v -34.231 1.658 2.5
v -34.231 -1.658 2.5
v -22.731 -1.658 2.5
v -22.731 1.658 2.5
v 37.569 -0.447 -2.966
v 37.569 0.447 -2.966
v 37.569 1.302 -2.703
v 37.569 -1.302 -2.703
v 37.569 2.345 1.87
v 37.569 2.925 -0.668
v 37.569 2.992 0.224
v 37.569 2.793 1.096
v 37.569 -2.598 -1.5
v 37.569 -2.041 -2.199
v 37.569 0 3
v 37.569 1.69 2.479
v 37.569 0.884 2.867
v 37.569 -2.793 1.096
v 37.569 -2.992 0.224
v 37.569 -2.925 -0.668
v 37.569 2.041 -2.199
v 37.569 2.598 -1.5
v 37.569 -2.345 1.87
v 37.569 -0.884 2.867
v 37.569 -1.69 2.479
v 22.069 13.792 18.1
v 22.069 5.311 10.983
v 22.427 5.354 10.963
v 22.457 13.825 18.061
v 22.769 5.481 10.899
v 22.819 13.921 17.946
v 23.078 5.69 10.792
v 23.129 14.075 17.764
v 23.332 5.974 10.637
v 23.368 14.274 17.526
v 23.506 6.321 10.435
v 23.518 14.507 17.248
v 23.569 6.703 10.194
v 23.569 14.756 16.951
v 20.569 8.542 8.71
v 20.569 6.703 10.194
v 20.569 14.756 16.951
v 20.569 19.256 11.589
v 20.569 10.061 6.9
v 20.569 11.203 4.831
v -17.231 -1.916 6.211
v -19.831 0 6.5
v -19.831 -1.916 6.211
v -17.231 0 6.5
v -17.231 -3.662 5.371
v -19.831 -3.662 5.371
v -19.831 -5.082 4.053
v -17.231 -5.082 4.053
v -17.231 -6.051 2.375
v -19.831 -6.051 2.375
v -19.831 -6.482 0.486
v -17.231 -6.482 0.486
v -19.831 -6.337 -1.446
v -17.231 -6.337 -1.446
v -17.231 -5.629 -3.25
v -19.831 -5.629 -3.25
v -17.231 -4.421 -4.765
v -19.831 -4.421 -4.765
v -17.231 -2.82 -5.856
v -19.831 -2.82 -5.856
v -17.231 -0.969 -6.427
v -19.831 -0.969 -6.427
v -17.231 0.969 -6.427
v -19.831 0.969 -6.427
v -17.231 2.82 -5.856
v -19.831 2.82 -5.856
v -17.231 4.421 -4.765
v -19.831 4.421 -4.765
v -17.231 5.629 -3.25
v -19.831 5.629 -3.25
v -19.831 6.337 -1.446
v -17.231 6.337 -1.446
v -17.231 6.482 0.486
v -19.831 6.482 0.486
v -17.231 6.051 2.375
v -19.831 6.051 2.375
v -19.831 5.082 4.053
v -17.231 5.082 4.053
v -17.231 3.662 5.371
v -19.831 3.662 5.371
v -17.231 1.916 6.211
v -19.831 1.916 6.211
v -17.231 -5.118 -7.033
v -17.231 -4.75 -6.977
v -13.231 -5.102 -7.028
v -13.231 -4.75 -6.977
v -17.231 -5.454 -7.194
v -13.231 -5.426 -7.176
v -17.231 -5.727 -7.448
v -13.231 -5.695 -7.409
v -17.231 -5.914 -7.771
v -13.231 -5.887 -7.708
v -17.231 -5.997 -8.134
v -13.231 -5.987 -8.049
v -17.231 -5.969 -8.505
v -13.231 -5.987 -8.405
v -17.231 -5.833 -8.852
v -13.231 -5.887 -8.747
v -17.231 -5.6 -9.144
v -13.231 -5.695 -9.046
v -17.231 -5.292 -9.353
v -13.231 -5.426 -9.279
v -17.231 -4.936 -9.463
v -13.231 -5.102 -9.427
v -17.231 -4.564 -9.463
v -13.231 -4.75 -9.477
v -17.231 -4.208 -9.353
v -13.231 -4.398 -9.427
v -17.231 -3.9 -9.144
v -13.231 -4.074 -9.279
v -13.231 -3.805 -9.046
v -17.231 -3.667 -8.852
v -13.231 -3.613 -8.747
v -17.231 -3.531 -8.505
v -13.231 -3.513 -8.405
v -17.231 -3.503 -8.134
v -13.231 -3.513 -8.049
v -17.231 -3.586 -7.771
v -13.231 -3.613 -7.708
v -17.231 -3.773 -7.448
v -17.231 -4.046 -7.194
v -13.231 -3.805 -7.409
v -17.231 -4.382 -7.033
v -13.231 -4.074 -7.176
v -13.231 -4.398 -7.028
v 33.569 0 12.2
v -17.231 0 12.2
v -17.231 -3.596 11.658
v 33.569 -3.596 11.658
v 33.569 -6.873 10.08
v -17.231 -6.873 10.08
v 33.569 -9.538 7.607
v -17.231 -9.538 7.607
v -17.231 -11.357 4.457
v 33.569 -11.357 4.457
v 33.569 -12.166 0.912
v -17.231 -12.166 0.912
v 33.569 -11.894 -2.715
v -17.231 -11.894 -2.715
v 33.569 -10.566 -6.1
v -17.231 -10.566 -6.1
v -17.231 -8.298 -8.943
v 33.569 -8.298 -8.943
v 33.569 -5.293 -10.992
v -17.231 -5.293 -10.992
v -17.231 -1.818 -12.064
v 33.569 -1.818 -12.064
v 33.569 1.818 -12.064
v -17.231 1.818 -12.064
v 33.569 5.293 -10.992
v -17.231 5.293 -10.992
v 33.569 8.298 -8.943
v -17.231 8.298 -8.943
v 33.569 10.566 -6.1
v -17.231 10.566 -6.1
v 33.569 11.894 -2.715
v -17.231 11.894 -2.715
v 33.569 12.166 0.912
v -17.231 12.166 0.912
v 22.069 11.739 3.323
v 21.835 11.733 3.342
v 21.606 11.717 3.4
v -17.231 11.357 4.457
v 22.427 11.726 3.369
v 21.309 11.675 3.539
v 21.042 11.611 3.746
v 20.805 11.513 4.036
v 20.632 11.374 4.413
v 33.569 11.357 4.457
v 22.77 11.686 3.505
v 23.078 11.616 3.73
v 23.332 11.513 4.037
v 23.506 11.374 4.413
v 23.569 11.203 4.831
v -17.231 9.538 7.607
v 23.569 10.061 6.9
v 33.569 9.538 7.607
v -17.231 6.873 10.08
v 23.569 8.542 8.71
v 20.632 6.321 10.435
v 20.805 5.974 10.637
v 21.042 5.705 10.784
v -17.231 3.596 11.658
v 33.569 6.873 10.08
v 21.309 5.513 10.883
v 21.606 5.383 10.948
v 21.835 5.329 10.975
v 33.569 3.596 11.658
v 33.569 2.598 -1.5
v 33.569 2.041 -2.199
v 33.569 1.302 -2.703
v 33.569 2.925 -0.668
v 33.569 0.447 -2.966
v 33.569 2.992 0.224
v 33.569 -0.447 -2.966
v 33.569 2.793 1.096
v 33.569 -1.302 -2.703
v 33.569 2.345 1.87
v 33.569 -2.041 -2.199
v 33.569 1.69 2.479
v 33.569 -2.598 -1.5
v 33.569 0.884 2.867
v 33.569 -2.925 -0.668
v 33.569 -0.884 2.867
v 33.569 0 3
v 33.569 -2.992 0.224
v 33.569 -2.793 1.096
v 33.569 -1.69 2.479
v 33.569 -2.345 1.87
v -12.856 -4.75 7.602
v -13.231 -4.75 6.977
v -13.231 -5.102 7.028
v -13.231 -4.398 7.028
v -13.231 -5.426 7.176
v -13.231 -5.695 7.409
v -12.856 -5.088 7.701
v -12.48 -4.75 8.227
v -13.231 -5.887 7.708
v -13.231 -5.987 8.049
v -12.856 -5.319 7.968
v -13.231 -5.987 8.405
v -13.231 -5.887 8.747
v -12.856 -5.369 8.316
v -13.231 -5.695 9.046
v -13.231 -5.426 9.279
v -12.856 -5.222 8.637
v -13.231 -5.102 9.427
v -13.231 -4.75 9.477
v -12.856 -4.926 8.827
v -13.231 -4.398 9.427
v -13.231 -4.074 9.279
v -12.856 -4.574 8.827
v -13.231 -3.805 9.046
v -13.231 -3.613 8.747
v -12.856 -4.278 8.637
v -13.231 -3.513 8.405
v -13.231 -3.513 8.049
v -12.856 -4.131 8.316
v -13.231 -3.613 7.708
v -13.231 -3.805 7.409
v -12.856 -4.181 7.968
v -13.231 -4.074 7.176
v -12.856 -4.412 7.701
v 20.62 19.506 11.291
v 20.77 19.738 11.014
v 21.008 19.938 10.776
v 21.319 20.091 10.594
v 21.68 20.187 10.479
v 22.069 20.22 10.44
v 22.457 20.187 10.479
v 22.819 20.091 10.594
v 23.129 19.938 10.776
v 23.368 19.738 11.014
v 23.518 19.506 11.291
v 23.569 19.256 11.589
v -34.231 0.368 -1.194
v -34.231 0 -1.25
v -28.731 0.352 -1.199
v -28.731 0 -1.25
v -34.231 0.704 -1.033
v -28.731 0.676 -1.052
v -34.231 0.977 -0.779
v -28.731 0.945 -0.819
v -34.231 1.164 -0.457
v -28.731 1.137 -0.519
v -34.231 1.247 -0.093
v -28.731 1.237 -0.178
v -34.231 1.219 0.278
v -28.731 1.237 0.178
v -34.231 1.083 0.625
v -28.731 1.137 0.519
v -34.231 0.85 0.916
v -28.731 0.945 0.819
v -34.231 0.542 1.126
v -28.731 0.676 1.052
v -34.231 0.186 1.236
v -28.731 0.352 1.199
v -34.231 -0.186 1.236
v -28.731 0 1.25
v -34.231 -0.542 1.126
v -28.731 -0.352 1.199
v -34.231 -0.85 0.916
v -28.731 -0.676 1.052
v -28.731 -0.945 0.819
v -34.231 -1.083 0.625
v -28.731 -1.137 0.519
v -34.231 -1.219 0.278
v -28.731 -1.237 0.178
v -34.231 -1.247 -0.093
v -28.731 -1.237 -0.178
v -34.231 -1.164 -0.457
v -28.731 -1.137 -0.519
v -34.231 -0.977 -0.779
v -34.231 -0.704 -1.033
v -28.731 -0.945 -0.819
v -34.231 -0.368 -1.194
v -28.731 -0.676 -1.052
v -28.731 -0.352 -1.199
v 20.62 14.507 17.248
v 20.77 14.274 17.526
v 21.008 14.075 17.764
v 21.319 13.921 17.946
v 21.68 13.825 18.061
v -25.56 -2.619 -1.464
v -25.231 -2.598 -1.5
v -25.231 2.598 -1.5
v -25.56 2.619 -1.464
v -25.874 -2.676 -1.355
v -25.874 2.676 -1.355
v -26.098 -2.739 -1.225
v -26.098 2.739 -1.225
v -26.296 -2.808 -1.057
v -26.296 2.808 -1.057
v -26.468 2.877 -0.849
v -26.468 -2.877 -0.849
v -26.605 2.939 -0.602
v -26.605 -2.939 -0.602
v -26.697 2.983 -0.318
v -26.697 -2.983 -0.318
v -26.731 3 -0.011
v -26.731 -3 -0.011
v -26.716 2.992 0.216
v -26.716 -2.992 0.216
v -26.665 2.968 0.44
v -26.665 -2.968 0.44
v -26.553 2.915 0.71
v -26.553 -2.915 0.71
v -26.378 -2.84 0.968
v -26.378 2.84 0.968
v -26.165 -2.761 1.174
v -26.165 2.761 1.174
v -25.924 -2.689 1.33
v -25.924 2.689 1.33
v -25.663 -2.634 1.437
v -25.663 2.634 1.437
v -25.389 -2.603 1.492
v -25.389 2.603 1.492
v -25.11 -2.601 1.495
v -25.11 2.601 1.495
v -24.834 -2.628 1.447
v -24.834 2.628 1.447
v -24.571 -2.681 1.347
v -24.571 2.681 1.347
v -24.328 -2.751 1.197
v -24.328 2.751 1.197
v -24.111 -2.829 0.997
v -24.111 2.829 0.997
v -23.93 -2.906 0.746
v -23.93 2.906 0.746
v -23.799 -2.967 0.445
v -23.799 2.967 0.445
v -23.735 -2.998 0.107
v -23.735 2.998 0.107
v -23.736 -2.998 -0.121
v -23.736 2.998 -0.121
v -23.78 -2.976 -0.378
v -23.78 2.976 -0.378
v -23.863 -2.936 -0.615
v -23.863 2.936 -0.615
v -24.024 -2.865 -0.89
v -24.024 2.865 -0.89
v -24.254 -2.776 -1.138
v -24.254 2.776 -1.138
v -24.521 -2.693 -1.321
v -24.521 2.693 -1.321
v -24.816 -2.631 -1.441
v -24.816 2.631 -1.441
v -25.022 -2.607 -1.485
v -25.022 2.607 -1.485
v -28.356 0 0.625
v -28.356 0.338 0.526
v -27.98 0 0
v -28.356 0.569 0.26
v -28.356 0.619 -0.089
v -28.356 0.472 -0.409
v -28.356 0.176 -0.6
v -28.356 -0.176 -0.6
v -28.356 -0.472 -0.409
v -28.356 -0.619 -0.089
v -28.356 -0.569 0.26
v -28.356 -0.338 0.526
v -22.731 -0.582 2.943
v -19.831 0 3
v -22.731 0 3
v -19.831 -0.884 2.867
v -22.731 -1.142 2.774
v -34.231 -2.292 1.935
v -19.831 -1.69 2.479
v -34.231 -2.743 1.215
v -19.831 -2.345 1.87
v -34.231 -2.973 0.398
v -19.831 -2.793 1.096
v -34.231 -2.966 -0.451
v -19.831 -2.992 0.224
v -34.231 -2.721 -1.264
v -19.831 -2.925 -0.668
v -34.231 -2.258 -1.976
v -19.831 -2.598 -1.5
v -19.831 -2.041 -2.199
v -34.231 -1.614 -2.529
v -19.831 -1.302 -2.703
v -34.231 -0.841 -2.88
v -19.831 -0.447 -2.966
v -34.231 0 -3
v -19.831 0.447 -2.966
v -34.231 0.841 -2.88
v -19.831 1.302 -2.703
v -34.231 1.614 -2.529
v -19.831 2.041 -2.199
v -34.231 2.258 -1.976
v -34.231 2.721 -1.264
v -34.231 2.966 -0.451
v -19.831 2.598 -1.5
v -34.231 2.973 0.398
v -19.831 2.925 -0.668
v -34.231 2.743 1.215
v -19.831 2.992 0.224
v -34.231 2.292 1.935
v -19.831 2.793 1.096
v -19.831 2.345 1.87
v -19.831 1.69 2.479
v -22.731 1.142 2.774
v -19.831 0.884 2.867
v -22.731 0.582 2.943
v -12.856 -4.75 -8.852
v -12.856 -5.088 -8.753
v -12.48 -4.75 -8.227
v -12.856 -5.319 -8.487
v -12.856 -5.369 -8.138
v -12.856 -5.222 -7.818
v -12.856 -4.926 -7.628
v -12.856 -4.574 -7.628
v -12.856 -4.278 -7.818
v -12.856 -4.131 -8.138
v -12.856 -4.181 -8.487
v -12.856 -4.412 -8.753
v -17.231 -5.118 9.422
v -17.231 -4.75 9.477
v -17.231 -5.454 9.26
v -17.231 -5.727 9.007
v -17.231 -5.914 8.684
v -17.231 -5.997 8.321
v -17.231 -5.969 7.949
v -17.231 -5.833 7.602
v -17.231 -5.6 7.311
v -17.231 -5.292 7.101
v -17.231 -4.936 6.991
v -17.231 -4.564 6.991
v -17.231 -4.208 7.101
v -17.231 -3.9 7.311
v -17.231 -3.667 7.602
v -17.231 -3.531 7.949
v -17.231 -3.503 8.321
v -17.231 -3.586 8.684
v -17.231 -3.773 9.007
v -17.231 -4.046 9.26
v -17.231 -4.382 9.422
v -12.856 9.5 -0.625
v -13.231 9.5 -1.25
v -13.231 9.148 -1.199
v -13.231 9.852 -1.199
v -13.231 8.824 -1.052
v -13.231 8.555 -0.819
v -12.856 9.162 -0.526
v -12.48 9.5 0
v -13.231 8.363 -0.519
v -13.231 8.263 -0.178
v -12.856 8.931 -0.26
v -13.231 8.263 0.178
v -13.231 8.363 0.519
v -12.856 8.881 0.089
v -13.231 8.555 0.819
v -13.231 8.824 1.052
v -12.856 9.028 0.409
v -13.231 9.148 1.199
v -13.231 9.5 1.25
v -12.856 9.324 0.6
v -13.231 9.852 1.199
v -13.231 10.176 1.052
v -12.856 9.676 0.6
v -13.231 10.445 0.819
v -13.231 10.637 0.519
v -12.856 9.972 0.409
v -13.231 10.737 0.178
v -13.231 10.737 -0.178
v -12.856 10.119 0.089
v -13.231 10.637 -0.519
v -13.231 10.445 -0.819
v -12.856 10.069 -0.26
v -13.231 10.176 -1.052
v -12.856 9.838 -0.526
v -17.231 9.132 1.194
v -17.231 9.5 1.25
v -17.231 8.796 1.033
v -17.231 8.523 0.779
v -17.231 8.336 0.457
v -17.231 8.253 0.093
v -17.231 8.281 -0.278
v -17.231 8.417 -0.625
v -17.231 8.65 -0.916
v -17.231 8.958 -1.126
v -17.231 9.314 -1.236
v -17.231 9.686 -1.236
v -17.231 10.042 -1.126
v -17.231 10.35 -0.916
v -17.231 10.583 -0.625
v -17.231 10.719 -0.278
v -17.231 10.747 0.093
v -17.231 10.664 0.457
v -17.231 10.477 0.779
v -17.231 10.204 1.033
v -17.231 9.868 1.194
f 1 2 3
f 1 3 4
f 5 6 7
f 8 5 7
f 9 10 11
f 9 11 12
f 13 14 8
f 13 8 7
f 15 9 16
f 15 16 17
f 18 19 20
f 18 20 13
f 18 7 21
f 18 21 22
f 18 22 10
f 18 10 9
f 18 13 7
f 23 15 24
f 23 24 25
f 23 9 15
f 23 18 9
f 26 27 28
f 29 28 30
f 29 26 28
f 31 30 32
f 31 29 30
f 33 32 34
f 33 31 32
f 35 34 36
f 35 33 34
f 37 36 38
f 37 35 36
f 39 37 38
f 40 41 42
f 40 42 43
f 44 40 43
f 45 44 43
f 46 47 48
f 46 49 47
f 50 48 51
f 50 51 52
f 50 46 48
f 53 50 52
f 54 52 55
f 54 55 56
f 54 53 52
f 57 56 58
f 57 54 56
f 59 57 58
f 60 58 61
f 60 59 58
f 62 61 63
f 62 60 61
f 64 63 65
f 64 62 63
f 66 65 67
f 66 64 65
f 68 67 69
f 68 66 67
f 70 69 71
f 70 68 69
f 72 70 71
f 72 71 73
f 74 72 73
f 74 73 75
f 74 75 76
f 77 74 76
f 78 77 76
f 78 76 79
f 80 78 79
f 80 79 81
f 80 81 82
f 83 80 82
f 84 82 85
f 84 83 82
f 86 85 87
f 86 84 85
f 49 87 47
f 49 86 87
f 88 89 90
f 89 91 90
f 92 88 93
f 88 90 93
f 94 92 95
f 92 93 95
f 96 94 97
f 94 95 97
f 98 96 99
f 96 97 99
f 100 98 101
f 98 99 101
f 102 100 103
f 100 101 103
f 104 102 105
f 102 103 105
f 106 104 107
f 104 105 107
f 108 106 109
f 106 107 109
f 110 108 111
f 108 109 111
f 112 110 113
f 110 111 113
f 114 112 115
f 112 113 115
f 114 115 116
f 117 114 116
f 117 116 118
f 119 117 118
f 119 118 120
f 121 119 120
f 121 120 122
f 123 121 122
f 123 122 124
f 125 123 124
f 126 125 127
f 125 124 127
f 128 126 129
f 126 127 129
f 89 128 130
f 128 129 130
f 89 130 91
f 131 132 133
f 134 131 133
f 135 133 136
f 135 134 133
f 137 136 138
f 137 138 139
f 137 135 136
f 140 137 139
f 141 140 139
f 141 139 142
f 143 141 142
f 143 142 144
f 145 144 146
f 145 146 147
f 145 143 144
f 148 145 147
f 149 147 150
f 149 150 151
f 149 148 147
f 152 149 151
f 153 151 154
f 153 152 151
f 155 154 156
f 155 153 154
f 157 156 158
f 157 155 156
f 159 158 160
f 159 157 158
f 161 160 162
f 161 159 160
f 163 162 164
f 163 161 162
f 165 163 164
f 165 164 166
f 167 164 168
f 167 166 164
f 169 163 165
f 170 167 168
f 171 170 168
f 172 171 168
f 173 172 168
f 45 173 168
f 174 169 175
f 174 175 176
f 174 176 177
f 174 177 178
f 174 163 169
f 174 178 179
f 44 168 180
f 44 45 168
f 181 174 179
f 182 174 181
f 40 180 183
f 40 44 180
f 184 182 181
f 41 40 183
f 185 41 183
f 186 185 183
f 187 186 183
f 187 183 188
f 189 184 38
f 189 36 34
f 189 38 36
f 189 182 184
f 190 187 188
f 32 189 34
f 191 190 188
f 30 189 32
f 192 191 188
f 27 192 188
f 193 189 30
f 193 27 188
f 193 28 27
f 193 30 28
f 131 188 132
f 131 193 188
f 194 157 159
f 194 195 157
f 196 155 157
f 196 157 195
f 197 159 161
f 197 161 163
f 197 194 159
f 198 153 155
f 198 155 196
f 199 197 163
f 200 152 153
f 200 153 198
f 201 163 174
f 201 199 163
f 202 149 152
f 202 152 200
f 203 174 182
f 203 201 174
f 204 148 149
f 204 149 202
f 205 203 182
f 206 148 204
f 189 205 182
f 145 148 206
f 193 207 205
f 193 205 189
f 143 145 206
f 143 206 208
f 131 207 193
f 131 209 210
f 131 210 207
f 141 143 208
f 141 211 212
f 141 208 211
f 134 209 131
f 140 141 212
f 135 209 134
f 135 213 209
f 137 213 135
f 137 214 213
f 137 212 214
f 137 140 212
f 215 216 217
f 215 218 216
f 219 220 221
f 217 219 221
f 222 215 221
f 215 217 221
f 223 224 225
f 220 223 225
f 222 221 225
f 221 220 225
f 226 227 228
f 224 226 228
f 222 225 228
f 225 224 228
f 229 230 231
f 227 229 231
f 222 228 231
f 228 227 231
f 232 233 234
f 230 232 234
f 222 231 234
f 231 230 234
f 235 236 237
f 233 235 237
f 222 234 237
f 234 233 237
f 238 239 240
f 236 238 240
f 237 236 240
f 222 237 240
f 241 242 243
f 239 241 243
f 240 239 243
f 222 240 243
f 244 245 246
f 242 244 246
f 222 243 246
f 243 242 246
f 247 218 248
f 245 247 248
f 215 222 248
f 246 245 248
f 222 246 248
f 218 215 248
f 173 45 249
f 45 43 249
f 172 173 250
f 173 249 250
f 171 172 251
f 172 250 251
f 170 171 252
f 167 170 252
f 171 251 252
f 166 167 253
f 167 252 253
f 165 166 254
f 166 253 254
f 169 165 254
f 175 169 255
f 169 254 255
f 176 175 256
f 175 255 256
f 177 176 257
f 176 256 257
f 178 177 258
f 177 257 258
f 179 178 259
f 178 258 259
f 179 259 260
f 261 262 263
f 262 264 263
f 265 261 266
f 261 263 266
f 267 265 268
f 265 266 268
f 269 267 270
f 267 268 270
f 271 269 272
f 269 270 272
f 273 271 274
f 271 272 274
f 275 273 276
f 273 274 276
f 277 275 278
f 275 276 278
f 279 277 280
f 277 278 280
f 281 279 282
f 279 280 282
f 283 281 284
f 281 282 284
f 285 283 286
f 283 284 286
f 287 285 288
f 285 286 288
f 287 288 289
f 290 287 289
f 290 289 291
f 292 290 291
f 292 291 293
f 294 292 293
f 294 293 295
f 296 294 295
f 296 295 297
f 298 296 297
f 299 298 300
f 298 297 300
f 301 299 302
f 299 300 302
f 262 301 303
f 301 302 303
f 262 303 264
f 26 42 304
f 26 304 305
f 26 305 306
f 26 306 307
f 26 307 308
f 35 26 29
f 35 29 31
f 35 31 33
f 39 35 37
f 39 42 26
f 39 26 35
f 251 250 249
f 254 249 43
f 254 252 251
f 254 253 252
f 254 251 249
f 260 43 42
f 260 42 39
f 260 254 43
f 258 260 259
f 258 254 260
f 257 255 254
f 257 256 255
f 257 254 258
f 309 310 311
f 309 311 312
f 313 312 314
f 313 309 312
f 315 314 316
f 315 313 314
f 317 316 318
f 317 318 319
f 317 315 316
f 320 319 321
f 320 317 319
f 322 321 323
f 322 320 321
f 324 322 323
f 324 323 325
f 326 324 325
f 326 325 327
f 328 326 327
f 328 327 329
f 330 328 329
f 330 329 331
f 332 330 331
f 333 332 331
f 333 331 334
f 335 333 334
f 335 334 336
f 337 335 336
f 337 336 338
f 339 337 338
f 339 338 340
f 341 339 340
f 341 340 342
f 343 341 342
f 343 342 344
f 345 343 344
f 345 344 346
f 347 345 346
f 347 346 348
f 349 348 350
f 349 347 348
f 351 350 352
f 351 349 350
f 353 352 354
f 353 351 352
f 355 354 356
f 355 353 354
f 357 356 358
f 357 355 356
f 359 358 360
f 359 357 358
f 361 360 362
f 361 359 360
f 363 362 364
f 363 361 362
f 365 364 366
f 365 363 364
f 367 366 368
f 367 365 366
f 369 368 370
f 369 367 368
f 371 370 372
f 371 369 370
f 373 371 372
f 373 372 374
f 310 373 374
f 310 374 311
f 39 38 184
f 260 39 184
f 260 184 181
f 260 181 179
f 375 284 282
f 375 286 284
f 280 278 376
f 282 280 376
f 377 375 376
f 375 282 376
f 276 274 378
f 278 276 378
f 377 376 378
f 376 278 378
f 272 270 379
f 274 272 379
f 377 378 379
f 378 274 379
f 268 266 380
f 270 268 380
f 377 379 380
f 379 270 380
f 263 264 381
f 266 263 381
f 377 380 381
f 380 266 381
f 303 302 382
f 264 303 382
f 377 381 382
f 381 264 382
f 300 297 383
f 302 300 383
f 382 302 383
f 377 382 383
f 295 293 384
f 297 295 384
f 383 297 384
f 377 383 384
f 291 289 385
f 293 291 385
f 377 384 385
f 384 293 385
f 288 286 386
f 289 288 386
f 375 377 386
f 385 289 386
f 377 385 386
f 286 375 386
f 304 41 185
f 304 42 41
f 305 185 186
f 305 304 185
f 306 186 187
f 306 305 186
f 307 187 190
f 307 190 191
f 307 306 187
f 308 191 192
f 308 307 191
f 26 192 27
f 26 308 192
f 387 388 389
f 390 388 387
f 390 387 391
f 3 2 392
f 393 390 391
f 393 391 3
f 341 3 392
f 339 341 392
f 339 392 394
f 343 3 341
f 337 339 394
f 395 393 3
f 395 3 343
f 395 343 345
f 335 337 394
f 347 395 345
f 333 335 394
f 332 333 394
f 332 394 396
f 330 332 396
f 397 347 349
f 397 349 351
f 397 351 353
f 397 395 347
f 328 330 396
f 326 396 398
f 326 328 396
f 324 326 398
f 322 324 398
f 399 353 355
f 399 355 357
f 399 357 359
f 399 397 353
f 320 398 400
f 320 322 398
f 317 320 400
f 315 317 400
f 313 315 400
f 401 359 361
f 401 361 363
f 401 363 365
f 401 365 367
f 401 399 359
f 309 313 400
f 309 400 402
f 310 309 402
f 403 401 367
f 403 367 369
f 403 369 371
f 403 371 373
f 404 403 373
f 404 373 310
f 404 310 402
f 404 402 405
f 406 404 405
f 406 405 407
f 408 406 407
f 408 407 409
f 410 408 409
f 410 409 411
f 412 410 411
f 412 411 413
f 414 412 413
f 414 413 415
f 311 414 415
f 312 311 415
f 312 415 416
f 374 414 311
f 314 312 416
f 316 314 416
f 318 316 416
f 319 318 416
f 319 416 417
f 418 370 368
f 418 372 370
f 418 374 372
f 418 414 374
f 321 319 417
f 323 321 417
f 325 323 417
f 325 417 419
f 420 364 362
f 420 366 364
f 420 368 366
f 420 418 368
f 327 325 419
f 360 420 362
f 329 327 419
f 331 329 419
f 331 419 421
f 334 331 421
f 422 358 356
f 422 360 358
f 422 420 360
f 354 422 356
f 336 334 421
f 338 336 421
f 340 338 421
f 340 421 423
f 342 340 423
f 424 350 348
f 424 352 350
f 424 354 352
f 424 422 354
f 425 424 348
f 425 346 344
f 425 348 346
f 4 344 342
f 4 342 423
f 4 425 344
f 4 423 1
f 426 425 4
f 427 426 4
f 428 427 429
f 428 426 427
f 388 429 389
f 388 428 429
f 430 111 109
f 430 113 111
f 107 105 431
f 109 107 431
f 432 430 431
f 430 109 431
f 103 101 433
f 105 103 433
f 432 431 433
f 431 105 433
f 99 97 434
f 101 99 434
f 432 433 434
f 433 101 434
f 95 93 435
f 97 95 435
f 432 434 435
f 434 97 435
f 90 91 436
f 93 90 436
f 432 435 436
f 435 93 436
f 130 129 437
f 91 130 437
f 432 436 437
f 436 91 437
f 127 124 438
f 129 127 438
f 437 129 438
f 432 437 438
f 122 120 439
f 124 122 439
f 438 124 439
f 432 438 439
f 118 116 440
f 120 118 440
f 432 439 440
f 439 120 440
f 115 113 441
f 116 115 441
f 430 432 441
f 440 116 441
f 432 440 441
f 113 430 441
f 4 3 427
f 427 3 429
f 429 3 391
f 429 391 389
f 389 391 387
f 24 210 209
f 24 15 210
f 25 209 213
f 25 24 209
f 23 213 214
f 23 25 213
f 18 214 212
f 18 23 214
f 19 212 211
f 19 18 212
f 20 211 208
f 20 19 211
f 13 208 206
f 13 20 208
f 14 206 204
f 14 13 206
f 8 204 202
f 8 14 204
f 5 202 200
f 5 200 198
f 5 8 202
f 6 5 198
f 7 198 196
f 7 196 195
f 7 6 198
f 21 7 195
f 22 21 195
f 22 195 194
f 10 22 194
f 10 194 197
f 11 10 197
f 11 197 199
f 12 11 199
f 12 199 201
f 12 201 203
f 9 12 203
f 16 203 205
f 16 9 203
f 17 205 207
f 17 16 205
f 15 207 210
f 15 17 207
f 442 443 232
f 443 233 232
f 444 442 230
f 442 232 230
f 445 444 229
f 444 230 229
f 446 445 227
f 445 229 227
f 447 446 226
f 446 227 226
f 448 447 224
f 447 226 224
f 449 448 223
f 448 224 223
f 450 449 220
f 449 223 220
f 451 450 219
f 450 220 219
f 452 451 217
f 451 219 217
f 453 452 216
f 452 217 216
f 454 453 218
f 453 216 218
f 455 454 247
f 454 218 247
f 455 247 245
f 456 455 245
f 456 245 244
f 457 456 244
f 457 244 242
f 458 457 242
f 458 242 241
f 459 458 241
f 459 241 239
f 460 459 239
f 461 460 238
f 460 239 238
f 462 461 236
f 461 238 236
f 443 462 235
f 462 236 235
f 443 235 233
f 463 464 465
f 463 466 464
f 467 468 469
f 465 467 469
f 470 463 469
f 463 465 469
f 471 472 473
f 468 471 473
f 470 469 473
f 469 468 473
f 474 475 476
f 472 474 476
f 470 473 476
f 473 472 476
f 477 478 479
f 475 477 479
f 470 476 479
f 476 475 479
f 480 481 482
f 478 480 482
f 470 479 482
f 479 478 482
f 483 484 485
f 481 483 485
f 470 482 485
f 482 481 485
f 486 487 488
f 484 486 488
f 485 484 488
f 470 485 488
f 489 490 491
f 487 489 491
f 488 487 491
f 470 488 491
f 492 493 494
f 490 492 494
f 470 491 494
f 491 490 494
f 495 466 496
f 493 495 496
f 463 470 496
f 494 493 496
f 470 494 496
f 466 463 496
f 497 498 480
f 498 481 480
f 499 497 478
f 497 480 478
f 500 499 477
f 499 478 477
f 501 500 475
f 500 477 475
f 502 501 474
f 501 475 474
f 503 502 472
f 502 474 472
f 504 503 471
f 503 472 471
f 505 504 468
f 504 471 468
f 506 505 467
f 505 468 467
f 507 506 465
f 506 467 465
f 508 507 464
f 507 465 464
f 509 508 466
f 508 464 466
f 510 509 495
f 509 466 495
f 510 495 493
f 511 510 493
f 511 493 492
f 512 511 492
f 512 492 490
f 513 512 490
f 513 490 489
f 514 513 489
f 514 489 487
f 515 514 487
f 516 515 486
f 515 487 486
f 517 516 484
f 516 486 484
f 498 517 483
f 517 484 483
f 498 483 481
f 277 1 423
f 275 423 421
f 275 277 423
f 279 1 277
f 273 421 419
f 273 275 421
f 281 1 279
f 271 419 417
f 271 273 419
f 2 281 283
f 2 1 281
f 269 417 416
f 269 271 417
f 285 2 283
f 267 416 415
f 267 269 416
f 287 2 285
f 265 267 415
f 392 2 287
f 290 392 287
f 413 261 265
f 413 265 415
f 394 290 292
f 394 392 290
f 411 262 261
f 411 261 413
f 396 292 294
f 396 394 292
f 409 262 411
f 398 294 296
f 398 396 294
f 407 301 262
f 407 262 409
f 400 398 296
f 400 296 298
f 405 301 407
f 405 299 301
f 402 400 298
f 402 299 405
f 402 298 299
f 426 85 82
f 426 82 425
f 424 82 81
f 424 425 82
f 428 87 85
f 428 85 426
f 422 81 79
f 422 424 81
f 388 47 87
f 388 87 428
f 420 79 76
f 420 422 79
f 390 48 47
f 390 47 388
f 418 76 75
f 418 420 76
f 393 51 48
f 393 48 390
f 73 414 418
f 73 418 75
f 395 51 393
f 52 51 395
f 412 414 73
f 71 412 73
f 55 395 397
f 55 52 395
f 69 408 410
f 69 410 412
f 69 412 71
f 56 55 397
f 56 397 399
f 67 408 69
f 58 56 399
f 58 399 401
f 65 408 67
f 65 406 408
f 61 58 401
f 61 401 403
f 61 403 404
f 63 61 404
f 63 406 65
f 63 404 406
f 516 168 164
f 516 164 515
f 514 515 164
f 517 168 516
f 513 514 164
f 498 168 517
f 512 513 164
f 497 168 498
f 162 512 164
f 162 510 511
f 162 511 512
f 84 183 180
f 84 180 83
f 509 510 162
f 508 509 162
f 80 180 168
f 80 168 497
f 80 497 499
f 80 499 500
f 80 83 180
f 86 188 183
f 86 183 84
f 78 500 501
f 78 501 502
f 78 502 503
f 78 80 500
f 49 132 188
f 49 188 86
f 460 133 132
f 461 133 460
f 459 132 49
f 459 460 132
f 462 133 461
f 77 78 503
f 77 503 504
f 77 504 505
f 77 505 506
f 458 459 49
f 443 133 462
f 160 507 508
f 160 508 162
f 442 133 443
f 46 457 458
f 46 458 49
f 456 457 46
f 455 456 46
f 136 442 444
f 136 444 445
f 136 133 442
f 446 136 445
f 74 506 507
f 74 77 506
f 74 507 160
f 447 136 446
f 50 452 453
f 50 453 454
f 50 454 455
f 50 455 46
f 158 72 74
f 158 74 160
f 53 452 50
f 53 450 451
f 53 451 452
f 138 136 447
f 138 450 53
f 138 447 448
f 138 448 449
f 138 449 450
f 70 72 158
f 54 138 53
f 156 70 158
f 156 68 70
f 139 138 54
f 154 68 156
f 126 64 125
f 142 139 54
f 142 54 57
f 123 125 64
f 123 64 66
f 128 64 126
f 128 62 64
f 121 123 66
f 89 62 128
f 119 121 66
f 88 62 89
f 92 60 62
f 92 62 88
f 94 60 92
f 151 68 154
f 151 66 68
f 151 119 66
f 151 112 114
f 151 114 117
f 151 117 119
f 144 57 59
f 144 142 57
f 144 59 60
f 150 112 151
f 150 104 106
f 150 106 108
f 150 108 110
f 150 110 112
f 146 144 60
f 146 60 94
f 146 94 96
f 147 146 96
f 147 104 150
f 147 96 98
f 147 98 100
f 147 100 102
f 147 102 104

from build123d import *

# Parameters (mm, degrees)
HOLE_WIZARD_M3_1_D       = 2.5
HOLE_WIZARD_M3_1_DEPTH   = 4
HOLE_WIZARD_M3_1_TIP     = 0.751075774
CUT_EXTRUDE_1_DEPTH      = 10
CUT_EXTRUDE_1_DEPTH_BACK = 10
SKETCH_4_R               = 1.5
SKETCH_5_W               = 6.291710533
SKETCH_5_H               = 14.520159288
CUT_EXTRUDE_2_DEPTH      = 11.5
HOLE_WIZARD_M3_2_D       = 2.5
HOLE_WIZARD_M3_2_DEPTH   = 5.5
HOLE_WIZARD_M3_2_TIP     = 0.751075774
EXTRUDE_2_DEPTH          = 10
EXTRUDE_2_DEPTH_BACK     = 10
SKETCH_9_W               = 3
SKETCH_9_H               = 10
FILLET_2_R               = 1.5


with BuildPart() as part:
    # 草图1 → 旋转1 (revolve)
    with BuildSketch(Plane.XY, mode=Mode.PRIVATE) as revolve_1_sk:
        Polygon((-34.231351781, 0), (-34.231351781, 3), (-19.831351781, 3), (-19.831351781, 6.5), (-17.231351781, 6.5), (-17.231351781, 12.2), (33.568648219, 12.2), (33.568648219, 3), (37.568648219, 3), (37.568648219, 0), align=None)
    revolve(revolve_1_sk.sketch.rotate(Axis((-36.151898734, 0, 0), (1, 0, 0)), 90), axis=Axis((-36.151898734, 0, 0), (1, 0, 0)))

    # M3 螺纹孔1
    with Locations(Plane(origin=(-17.231351781, 9.5, 0), x_dir=(0, 0, -1), z_dir=(-1, 0, 0))):
        with Locations((0, 0), (8.227241336, 14.25), (-8.227241336, 14.25)):
            Hole(HOLE_WIZARD_M3_1_D / 2, depth=HOLE_WIZARD_M3_1_DEPTH)
            with Locations((0, 0, -(HOLE_WIZARD_M3_1_DEPTH + HOLE_WIZARD_M3_1_TIP / 2))):  # 118° drill point
                Cone(0, HOLE_WIZARD_M3_1_D / 2, HOLE_WIZARD_M3_1_TIP, mode=Mode.SUBTRACT)

    # 草图4 → 切除-拉伸1 (cut, two sides: drawn at the far end of the back side and taken through both)
    with BuildSketch(Plane(origin=(0, 0, 0), x_dir=(1, 0, 0), z_dir=(0, 1, 0)).offset(-CUT_EXTRUDE_1_DEPTH_BACK)):
        with Locations(Location((-25.231351781, 0, 0), (0, 0, 90))):
            Circle(SKETCH_4_R)
    extrude(amount=CUT_EXTRUDE_1_DEPTH + CUT_EXTRUDE_1_DEPTH_BACK, mode=Mode.SUBTRACT)

    # 草图5 → 切除-拉伸2 (cut)
    with BuildSketch(Plane.ZY.offset(34.231351781)):
        with Locations((5.645855266, 0)):
            Rectangle(SKETCH_5_W, SKETCH_5_H)
    extrude(amount=-CUT_EXTRUDE_2_DEPTH, mode=Mode.SUBTRACT)

    # M3 螺纹孔2
    with Locations(Plane.ZY.offset(34.231351781)):
        with Locations((0, 0)):
            Hole(HOLE_WIZARD_M3_2_D / 2, depth=HOLE_WIZARD_M3_2_DEPTH)
            with Locations((0, 0, -(HOLE_WIZARD_M3_2_DEPTH + HOLE_WIZARD_M3_2_TIP / 2))):  # 118° drill point
                Cone(0, HOLE_WIZARD_M3_2_D / 2, HOLE_WIZARD_M3_2_TIP, mode=Mode.SUBTRACT)

    # 草图9 → 凸台-拉伸2 (add, two sides: drawn at the far end of the back side and taken through both)
    with BuildSketch(Plane(origin=(0, 9.345742206, 7.842008838), x_dir=(1, 0, 0), z_dir=(0, 0.7660444431189817, 0.642787609686535)).offset(-EXTRUDE_2_DEPTH_BACK)):
        with Locations((22.068648219, 0)):
            Rectangle(SKETCH_9_W, SKETCH_9_H)
    extrude(amount=EXTRUDE_2_DEPTH + EXTRUDE_2_DEPTH_BACK)

    # 圆角2
    fillet_2_edges = [part.edges().sort_by_distance(p)[0] for p in [
        (23.568648219, 9.55155762, 14.541744923),
        (20.568648219, 9.55155762, 14.541744923),
        (23.568648219, 15.979433717, 6.881300491),
        (20.568648219, 15.979433717, 6.881300491),
    ]]
    fillet(fillet_2_edges, radius=FILLET_2_R - 0.0001)  # a hair under: the kernel refuses the full size


solid = part.part
